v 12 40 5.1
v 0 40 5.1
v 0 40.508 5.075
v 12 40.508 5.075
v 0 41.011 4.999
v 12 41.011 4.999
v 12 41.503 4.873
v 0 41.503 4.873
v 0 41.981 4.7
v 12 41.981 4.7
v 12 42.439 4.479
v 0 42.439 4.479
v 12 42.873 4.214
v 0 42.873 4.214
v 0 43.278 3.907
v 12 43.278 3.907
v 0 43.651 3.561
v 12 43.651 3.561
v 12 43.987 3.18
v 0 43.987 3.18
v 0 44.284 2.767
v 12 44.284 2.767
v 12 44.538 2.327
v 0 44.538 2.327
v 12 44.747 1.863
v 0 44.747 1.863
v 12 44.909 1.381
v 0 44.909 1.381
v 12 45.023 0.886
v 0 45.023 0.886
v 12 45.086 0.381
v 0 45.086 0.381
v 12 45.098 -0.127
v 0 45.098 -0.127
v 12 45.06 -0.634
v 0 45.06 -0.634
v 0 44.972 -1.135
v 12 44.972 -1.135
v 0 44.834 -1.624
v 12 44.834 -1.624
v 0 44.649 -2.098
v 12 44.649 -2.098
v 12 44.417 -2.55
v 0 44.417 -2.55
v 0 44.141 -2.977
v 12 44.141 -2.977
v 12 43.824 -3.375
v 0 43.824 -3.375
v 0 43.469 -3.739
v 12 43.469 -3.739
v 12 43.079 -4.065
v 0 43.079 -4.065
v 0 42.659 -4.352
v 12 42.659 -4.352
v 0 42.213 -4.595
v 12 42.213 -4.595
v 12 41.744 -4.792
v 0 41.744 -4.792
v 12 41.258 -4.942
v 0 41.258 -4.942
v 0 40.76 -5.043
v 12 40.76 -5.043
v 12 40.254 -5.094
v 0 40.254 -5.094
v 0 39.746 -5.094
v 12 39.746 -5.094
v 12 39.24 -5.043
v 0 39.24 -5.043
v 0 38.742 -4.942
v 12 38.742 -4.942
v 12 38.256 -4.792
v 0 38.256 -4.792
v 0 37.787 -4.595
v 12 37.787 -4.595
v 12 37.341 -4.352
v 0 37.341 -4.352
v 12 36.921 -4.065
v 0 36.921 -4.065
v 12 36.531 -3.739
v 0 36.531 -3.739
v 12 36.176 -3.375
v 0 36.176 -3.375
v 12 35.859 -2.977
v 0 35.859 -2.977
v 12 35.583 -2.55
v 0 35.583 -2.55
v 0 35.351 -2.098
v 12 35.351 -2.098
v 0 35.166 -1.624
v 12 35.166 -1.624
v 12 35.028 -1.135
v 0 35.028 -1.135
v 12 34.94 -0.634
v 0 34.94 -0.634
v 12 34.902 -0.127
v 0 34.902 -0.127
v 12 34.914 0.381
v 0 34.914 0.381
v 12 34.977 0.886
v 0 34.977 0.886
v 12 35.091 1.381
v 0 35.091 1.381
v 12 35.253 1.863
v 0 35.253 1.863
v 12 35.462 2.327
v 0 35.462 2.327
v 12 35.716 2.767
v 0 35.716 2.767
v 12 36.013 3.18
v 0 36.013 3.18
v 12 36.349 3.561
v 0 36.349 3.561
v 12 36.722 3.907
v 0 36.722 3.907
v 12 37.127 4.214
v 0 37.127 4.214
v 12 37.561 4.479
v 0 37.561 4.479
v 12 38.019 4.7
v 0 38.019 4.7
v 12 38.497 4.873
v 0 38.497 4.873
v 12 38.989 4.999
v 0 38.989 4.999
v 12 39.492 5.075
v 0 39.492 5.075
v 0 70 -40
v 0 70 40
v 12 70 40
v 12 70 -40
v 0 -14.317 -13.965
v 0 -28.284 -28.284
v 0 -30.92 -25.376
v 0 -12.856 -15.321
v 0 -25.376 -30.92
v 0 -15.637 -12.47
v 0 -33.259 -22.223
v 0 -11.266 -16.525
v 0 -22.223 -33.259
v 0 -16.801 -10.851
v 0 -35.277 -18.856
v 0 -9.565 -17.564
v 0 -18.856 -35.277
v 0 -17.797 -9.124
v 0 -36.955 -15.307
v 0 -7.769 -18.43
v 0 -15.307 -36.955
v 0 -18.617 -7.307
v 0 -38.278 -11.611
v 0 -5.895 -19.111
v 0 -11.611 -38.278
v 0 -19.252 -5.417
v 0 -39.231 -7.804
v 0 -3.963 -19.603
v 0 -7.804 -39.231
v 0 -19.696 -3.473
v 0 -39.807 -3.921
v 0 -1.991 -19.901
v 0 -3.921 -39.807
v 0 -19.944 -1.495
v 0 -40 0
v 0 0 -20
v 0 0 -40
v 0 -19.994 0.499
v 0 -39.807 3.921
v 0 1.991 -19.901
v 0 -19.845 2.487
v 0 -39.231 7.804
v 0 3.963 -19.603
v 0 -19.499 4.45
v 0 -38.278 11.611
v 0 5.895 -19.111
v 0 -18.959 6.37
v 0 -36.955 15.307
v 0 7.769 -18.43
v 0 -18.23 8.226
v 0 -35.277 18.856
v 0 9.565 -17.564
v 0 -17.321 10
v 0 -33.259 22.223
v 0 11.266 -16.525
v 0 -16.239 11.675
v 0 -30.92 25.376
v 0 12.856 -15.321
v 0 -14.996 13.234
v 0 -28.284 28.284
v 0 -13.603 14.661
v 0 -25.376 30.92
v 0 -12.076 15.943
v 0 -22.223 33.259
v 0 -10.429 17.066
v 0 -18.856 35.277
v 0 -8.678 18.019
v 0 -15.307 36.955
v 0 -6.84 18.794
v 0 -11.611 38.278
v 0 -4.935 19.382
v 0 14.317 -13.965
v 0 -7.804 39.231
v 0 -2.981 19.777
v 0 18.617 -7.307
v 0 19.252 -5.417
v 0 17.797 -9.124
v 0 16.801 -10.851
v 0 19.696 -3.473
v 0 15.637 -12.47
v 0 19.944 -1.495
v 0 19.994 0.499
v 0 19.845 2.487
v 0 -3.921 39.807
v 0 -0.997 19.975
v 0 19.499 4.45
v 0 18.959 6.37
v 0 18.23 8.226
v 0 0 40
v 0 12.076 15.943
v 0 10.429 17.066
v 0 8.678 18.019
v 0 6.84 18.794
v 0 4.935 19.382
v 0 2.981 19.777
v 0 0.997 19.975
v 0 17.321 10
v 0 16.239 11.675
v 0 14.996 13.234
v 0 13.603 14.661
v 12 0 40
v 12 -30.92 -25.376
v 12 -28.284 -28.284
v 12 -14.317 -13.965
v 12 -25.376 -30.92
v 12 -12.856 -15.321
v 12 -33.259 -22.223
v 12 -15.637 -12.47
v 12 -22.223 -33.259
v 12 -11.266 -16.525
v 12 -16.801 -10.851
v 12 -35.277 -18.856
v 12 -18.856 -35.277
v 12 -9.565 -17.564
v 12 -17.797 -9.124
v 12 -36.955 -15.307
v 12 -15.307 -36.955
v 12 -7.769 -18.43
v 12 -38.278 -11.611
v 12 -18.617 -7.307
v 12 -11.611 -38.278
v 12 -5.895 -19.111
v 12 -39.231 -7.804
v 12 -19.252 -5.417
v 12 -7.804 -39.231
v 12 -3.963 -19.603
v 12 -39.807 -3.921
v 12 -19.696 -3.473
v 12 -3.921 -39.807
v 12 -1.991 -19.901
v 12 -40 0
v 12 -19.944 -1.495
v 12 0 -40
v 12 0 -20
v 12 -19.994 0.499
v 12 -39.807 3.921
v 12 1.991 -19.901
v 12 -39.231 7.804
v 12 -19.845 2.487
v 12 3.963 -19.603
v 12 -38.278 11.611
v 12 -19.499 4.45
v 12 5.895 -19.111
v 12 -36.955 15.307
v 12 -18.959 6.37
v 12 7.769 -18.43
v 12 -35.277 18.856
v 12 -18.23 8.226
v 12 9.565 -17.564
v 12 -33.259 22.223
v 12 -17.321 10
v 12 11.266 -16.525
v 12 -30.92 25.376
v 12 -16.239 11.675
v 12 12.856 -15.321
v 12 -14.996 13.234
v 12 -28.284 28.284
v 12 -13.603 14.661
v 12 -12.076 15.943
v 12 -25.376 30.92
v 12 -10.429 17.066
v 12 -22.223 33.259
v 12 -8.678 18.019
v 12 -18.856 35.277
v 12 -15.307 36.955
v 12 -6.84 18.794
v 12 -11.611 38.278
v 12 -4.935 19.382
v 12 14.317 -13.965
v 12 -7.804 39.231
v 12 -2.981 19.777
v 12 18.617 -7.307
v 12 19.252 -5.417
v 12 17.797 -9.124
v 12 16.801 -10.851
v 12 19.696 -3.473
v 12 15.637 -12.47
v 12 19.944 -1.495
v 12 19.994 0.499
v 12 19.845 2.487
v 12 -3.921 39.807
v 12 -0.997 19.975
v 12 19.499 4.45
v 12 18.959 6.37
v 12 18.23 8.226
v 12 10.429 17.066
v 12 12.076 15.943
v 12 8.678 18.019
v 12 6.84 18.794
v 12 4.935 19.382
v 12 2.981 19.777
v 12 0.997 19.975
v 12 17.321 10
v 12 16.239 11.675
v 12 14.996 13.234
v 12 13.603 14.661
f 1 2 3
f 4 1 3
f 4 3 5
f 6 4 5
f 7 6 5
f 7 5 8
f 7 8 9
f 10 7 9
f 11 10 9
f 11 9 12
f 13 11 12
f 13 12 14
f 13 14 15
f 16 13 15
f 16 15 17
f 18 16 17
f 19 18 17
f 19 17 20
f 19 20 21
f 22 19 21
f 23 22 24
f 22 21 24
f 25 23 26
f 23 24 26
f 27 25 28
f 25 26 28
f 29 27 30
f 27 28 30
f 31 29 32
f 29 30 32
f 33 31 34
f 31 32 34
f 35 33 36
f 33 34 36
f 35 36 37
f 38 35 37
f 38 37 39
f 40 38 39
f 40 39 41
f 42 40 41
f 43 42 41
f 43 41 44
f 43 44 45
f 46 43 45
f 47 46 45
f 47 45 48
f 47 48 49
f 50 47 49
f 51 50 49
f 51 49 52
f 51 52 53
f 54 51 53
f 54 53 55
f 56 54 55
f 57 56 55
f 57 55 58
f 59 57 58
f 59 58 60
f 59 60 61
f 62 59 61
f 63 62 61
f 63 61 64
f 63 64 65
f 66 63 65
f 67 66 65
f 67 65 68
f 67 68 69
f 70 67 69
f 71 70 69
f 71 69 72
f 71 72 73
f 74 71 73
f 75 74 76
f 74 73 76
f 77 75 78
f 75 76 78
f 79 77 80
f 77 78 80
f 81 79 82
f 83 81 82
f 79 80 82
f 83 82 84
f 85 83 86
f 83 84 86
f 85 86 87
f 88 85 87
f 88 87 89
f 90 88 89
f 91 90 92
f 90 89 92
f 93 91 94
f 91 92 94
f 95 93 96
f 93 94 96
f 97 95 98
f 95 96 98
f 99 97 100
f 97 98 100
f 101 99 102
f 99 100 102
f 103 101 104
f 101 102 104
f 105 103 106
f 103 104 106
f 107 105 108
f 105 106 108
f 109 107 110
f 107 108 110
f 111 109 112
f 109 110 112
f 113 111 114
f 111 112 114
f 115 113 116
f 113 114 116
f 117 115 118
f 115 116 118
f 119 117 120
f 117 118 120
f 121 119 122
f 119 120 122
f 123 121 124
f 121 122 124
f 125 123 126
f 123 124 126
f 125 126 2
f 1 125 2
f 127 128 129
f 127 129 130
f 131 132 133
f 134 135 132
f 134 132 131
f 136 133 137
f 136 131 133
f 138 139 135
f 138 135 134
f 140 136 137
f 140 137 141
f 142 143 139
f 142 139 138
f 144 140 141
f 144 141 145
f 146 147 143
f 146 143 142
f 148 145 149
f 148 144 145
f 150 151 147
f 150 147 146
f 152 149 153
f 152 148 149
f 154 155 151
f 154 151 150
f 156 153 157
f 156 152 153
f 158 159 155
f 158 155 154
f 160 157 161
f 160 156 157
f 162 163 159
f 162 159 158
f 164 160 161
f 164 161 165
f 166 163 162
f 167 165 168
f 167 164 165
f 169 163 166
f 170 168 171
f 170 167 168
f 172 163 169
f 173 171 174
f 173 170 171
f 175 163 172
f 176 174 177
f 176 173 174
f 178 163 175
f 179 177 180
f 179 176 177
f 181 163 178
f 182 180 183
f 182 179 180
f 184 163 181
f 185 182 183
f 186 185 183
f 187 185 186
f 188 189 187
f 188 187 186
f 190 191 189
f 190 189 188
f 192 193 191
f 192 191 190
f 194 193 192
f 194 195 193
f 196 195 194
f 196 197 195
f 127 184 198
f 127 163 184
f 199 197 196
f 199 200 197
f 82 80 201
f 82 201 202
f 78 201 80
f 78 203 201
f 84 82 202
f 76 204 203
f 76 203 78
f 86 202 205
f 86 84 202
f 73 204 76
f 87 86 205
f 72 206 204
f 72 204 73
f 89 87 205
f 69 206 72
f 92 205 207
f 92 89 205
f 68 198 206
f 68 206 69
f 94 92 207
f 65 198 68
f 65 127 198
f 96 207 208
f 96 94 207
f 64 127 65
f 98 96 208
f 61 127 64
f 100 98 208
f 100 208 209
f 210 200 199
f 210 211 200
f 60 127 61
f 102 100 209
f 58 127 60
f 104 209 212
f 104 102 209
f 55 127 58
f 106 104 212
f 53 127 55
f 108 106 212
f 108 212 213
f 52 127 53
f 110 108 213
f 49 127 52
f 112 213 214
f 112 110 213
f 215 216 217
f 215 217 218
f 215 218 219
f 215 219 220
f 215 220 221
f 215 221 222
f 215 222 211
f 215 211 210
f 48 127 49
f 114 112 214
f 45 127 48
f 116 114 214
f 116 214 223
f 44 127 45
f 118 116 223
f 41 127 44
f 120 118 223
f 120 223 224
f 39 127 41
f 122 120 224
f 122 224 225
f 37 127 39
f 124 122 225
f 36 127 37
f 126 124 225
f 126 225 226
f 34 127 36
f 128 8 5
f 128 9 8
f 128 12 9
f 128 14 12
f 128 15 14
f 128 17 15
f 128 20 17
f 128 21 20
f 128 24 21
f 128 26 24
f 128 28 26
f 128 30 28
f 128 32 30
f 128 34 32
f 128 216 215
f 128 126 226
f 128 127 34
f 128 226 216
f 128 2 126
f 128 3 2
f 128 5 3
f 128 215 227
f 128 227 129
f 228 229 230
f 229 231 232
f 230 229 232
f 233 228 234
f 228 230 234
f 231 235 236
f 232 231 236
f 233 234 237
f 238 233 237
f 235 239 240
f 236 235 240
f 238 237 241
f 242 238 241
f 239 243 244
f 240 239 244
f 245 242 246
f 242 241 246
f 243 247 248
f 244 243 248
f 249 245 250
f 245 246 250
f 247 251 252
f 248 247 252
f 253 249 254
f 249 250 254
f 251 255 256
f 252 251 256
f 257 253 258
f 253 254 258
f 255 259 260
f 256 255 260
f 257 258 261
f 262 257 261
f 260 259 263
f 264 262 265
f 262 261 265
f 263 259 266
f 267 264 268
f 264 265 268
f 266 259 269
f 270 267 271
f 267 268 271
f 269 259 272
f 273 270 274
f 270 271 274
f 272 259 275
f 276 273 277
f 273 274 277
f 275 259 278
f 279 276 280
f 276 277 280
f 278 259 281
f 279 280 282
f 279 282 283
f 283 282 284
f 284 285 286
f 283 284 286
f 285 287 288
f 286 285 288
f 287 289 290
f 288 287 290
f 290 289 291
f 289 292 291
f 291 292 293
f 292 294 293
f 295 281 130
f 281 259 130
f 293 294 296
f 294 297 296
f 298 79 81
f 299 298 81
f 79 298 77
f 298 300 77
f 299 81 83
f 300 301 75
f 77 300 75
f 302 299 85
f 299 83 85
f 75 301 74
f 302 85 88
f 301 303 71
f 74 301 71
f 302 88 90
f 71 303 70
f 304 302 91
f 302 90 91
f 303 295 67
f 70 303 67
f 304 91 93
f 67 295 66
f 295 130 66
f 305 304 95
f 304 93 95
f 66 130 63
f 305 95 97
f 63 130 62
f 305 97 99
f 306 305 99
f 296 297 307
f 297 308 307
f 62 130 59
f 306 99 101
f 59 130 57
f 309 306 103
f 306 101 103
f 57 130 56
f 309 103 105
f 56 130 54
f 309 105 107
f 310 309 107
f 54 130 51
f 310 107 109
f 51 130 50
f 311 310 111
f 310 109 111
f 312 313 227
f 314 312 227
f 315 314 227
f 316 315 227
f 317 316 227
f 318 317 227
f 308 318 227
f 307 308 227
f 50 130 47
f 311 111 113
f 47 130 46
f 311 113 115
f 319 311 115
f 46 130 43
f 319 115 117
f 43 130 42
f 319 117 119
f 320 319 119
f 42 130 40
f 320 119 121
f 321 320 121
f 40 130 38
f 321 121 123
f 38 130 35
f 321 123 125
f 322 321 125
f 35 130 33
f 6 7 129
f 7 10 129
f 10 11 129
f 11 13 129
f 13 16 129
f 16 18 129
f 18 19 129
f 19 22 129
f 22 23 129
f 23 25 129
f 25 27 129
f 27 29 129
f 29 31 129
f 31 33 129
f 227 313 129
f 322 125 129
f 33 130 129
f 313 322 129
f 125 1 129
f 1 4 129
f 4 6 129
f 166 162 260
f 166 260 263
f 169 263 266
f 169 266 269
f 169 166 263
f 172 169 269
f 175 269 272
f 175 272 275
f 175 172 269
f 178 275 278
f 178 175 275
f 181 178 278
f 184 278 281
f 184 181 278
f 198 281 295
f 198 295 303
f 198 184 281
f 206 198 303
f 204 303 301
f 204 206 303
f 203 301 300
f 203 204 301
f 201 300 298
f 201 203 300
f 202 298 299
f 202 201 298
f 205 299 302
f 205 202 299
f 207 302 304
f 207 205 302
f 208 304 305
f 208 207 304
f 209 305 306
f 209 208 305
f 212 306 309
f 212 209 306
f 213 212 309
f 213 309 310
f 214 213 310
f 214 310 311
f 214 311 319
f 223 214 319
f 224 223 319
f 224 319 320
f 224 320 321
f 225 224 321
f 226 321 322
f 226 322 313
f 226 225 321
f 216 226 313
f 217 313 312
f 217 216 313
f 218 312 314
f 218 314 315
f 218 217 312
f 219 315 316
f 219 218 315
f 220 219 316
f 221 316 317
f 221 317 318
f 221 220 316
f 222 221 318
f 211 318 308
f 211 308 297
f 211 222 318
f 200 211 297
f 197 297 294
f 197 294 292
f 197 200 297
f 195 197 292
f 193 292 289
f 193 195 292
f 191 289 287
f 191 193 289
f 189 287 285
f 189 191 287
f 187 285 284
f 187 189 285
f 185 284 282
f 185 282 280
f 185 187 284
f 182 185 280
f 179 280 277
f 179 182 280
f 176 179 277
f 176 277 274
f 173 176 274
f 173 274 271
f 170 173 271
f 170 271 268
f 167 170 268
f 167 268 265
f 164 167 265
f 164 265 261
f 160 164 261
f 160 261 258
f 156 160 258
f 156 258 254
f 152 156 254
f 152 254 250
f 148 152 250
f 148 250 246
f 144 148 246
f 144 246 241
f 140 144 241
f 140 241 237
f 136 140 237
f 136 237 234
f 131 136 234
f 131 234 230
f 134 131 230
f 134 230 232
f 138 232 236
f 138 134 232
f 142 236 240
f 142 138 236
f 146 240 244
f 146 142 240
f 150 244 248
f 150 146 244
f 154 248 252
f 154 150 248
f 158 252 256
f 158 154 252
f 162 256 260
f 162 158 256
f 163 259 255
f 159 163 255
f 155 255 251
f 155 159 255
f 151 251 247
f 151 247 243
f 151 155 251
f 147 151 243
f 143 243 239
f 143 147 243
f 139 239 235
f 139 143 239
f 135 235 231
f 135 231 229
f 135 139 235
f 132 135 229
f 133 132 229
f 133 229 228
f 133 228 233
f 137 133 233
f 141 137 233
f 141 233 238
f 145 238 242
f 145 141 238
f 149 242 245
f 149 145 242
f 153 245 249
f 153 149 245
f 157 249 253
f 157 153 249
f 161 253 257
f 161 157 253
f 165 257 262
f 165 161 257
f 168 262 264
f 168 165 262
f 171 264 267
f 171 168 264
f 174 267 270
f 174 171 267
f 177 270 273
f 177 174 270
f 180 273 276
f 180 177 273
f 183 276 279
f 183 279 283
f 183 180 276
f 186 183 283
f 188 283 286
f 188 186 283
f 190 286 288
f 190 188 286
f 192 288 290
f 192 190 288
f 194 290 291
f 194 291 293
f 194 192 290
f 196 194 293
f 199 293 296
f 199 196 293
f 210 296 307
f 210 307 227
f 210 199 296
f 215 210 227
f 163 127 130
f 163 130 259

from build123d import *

# Parameters (mm, degrees)
SKETCH_1_R          = 20
EXTRUDE_1_DEPTH     = 12
HOLE_WIZARD_M12_1_D = 10.2


with BuildPart() as part:
    # 草图1 → 凸台-拉伸1 (new body)
    with BuildSketch(Plane(origin=(0, 0, 0), x_dir=(0, 0, -1), z_dir=(1, 0, 0))):
        with BuildLine():
            Line((-40, 0), (-40, 70))
            Line((-40, 70), (40, 70))
            Line((40, 70), (40, 0))
            ThreePointArc((40, 0), (0, -40), (-40, 0))
        make_face()
        Circle(SKETCH_1_R, mode=Mode.SUBTRACT)
    extrude(amount=EXTRUDE_1_DEPTH)

    # M12 螺纹孔1 (through all)
    with Locations(Plane(origin=(12, 0, 0), x_dir=(0, 0, -1), z_dir=(1, 0, 0))):
        with Locations((0, 40)):
            Hole(HOLE_WIZARD_M12_1_D / 2)


solid = part.part
